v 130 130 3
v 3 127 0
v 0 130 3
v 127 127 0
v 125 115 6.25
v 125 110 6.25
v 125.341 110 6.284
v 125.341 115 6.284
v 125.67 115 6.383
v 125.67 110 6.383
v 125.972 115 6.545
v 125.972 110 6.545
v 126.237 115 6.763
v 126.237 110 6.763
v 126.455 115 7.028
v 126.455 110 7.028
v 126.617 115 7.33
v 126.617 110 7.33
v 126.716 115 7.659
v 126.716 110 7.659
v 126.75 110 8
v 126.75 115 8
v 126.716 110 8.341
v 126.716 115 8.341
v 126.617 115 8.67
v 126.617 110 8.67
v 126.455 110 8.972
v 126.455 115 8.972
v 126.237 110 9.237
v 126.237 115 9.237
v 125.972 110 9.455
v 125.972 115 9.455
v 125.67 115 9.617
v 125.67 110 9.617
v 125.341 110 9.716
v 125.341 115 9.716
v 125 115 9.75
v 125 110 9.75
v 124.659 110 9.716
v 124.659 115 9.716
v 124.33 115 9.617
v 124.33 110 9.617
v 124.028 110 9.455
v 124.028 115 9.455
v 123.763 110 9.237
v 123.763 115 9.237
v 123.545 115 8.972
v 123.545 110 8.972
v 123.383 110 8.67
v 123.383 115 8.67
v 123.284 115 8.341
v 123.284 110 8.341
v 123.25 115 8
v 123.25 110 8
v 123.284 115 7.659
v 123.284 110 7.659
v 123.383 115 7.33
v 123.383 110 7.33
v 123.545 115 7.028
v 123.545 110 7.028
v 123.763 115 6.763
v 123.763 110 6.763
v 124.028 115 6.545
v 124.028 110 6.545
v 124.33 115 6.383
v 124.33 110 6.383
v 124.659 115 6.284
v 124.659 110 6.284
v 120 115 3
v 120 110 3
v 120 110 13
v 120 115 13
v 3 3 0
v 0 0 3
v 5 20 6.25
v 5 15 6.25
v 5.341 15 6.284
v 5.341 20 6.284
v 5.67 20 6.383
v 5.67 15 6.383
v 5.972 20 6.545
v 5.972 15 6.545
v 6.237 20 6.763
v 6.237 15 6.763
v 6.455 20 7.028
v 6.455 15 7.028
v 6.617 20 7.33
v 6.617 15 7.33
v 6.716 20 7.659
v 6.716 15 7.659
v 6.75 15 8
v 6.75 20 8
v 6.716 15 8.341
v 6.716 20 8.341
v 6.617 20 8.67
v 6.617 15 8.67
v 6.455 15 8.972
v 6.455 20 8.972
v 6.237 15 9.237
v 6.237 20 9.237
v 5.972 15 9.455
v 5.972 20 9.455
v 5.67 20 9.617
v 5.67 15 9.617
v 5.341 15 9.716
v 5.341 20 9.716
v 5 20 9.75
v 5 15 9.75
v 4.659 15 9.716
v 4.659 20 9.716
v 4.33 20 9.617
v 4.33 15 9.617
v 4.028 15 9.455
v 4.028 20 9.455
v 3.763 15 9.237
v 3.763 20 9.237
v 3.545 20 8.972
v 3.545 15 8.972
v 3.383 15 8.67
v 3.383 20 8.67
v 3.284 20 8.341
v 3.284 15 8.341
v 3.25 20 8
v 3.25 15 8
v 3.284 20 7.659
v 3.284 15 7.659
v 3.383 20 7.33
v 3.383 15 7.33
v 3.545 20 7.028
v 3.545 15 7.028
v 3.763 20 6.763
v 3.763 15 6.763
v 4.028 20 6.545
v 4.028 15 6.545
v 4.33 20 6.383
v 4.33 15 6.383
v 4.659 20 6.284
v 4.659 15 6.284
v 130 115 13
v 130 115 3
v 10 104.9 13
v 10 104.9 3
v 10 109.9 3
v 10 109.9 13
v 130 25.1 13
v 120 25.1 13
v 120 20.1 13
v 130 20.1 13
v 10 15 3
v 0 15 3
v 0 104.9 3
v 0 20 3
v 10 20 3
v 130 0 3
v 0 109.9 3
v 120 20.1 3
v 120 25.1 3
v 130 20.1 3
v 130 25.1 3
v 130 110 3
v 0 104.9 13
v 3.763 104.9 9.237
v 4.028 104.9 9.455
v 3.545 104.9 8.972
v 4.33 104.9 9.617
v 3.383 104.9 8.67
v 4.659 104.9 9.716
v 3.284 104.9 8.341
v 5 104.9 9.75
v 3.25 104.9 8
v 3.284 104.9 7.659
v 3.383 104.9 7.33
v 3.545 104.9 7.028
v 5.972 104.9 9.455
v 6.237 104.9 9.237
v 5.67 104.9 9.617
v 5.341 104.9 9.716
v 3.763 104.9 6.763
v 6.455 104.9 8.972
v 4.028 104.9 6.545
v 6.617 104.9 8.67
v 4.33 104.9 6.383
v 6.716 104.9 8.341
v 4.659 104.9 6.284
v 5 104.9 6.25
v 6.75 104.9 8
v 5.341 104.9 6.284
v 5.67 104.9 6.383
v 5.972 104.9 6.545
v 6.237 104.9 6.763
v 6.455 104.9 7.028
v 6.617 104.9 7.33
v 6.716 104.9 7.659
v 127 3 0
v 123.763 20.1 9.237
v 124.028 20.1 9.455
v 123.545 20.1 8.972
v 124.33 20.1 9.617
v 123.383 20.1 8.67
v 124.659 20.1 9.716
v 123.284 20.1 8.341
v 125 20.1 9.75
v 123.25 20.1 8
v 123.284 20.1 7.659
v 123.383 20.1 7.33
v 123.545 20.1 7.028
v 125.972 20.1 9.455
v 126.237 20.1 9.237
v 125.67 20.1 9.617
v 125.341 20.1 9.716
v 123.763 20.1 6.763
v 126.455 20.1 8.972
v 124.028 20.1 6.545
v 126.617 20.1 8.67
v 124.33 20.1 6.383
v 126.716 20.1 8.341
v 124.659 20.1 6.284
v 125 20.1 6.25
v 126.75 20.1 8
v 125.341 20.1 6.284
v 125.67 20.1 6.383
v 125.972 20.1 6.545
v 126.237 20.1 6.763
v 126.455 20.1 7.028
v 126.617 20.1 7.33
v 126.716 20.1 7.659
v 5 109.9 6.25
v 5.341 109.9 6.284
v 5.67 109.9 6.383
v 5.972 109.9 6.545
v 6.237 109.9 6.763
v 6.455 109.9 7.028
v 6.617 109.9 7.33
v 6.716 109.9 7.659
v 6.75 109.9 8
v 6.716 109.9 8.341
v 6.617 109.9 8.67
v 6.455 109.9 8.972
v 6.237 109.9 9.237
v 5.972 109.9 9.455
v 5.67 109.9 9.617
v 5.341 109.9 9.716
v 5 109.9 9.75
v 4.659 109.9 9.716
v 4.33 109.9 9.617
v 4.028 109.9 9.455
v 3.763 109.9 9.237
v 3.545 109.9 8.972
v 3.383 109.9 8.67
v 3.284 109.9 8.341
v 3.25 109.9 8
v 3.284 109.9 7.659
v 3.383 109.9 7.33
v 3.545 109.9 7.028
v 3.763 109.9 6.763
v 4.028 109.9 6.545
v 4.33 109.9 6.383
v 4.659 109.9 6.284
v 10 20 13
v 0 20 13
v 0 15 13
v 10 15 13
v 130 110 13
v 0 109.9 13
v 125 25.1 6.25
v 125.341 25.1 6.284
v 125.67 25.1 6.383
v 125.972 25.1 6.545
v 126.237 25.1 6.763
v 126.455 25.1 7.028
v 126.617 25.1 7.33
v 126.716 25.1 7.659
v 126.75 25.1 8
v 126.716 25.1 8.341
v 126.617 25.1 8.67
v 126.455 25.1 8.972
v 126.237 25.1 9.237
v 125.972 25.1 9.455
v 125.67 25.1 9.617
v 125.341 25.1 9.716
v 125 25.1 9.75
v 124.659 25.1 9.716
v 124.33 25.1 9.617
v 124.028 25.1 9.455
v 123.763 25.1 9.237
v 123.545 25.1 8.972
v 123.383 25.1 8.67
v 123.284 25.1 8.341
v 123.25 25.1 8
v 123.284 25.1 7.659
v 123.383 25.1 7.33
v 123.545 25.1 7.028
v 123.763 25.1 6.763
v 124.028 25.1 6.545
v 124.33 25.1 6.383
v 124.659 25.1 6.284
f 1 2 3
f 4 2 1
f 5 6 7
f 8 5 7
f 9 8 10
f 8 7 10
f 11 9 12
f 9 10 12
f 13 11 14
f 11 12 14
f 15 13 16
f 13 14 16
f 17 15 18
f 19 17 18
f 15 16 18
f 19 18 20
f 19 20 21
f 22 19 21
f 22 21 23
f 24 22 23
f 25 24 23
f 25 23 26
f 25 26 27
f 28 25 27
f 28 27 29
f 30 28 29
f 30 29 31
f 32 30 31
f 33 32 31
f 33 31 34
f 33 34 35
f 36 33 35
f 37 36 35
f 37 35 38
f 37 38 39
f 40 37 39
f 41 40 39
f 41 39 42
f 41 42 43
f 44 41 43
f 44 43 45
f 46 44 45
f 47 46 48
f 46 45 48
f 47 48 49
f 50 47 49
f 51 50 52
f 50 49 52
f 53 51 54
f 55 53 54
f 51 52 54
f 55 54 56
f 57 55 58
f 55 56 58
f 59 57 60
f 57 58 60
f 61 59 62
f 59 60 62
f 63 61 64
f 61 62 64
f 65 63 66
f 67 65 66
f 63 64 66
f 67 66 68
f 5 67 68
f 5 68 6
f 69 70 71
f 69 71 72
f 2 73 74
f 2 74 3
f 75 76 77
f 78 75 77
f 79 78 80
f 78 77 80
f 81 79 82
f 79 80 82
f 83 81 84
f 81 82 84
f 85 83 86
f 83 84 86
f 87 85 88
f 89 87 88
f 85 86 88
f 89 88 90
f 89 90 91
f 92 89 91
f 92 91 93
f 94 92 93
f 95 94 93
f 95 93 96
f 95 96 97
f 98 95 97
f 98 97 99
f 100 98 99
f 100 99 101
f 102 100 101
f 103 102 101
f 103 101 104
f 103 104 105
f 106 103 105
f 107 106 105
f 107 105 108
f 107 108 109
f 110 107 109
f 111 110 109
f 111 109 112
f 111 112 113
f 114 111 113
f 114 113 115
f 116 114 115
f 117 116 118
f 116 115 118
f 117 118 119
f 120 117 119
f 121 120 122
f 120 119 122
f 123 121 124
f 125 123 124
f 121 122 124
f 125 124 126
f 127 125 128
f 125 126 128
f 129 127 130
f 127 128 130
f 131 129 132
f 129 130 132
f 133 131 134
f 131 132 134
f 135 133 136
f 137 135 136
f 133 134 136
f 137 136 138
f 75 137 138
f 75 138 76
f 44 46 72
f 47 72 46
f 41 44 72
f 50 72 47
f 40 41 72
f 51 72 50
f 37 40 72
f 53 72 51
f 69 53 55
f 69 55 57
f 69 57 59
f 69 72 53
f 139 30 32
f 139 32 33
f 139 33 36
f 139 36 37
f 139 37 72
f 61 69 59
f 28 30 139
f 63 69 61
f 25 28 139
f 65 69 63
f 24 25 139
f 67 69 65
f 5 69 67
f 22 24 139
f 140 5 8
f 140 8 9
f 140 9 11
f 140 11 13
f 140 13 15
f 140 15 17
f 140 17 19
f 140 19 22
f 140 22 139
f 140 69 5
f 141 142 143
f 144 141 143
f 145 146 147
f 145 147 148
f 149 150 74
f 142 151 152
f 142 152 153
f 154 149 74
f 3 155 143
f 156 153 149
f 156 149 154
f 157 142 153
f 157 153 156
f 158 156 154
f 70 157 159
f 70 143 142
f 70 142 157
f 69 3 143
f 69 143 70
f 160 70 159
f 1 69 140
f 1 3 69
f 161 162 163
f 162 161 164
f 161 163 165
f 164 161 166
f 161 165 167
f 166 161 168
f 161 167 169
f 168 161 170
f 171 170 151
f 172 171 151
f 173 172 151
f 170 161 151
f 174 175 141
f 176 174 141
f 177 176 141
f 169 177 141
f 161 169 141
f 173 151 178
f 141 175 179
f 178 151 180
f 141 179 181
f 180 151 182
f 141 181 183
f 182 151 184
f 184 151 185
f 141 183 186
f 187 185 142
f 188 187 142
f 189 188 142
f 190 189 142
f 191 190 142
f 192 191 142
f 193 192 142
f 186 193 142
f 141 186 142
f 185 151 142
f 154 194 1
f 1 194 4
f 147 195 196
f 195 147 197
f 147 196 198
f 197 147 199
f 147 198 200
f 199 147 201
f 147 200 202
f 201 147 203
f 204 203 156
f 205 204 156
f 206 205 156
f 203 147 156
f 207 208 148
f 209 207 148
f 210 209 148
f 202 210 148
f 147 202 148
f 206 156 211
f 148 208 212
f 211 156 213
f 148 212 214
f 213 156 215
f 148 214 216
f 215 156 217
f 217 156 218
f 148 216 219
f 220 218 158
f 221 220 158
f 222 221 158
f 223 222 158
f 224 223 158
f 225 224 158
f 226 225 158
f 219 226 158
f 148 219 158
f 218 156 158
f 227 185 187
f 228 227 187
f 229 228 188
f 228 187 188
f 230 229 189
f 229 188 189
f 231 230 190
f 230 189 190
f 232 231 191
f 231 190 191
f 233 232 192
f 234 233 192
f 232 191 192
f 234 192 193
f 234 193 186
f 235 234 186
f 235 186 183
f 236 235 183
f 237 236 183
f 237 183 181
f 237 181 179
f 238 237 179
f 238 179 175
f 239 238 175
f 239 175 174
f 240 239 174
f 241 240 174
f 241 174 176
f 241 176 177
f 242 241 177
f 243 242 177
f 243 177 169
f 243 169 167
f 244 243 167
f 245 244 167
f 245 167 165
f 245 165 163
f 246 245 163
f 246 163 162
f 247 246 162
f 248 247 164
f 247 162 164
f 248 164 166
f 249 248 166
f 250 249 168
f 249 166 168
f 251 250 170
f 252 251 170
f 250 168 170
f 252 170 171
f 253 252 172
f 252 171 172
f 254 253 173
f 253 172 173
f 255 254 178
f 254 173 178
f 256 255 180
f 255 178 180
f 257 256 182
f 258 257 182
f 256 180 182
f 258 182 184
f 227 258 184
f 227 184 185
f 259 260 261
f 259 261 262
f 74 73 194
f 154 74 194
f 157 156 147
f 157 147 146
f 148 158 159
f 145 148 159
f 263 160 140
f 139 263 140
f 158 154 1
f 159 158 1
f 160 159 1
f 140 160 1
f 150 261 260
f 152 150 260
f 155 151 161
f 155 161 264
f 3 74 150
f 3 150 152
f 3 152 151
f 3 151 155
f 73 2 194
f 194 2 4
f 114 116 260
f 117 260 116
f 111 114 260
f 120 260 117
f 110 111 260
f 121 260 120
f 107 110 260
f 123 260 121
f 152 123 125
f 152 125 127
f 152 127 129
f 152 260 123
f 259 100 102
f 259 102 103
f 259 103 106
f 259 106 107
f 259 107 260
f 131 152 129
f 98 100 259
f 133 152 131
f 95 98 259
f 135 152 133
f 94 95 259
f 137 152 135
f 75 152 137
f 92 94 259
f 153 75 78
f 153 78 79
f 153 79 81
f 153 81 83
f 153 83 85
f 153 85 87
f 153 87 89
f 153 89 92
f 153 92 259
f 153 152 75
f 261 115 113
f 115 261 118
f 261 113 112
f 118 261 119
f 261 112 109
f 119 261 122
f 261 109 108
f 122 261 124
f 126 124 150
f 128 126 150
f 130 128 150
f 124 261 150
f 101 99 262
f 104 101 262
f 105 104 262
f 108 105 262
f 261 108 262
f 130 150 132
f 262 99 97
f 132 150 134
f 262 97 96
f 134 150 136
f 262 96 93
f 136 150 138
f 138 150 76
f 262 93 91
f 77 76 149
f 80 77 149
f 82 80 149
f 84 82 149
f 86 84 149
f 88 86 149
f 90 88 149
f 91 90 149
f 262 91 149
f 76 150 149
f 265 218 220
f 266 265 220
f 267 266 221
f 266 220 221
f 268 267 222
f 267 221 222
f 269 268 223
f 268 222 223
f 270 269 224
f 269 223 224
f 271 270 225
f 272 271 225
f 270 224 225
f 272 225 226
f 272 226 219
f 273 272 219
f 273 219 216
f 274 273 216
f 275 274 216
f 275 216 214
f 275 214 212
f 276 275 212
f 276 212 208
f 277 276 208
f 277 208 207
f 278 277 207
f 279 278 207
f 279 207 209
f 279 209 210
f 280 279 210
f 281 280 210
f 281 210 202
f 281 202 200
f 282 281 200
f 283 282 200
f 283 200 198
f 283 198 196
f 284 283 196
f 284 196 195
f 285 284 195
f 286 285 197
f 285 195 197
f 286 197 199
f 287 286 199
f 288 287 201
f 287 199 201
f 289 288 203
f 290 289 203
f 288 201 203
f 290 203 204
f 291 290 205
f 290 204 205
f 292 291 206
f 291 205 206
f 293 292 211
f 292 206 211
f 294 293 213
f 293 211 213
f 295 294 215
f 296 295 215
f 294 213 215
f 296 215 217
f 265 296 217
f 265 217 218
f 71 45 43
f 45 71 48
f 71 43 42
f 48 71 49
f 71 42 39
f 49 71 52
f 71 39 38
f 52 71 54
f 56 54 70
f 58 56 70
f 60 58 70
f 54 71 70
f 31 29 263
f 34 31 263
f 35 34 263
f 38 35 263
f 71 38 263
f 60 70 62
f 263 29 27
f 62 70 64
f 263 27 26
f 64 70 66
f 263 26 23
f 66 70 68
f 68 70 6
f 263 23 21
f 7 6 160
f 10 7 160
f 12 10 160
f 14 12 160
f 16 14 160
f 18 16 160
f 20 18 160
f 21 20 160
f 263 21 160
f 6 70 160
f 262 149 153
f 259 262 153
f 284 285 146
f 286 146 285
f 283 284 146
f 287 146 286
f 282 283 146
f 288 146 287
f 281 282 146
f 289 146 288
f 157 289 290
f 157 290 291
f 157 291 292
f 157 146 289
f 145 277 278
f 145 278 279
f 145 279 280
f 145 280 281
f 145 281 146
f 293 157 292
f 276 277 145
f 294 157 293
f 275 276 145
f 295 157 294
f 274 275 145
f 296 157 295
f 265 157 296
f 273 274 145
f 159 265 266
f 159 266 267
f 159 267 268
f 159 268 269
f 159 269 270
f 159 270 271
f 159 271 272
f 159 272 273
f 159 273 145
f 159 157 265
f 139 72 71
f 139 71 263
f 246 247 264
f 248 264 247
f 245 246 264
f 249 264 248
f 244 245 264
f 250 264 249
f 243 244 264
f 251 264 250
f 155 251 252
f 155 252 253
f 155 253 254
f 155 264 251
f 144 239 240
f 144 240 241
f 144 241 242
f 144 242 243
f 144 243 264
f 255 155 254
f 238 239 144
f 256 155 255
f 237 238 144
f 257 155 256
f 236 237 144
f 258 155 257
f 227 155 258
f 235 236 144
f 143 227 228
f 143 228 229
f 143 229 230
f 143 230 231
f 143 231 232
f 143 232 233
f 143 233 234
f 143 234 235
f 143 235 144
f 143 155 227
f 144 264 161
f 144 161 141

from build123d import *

# Parameters (mm, degrees)
ESQUISSE1_W             = 130
ESQUISSE1_H             = 130
BOSS_EXTRU_1_DEPTH      = 3
CHANFREIN1_SIZE         = 3
ESQUISSE2_W             = 10
ESQUISSE2_H             = 5
BOSS_EXTRU_2_DEPTH      = 10
ESQUISSE4_R             = 1.75
ENL_V_MAT_EXTRU_1_DEPTH = 175.051716452
ESQUISSE5_R             = 1.75
ENL_V_MAT_EXTRU_2_DEPTH = 171.724954239


with BuildPart() as part:
    # Esquisse1 → Boss.-Extru.1 (new body)
    with BuildSketch(Plane.XY):
        with Locations((65, 65)):
            Rectangle(ESQUISSE1_W, ESQUISSE1_H)
    extrude(amount=BOSS_EXTRU_1_DEPTH)

    # Chanfrein1
    chanfrein1_edges = [part.edges().sort_by_distance(p)[0] for p in [
        (65, 130, 0),
        (130, 65, 0),
        (65, 0, 0),
        (0, 65, 0),
    ]]
    chamfer(chanfrein1_edges, length=CHANFREIN1_SIZE - 0.0001)  # a hair under: the kernel refuses the full size

    # Esquisse2 → Boss.-Extru.2 (add)
    with BuildSketch(Plane.XY.offset(3)):
        with Locations((5, 107.4)):
            Rectangle(ESQUISSE2_W, ESQUISSE2_H)
        with Locations((5, 17.5)):
            Rectangle(ESQUISSE2_W, ESQUISSE2_H)
        with Locations((125, 22.6)):
            Rectangle(ESQUISSE2_W, ESQUISSE2_H)
        with Locations((125, 112.5)):
            Rectangle(ESQUISSE2_W, ESQUISSE2_H)
    extrude(amount=BOSS_EXTRU_2_DEPTH)

    # Esquisse4 → Enlèv. mat.-Extru.1 (cut, through all)
    with BuildSketch(Plane.XZ.offset(-15)):
        with Locations(Location((5, 8, 0), (0, 0, 270))):
            Circle(ESQUISSE4_R)
    extrude(amount=-ENL_V_MAT_EXTRU_1_DEPTH, mode=Mode.SUBTRACT)

    # Esquisse5 → Enlèv. mat.-Extru.2 (cut, through all)
    with BuildSketch(Plane.XZ.offset(-20.1)):
        with Locations(Location((125, 8, 0), (0, 0, 270))):
            Circle(ESQUISSE5_R)
    extrude(amount=-ENL_V_MAT_EXTRU_2_DEPTH, mode=Mode.SUBTRACT)


solid = part.part
